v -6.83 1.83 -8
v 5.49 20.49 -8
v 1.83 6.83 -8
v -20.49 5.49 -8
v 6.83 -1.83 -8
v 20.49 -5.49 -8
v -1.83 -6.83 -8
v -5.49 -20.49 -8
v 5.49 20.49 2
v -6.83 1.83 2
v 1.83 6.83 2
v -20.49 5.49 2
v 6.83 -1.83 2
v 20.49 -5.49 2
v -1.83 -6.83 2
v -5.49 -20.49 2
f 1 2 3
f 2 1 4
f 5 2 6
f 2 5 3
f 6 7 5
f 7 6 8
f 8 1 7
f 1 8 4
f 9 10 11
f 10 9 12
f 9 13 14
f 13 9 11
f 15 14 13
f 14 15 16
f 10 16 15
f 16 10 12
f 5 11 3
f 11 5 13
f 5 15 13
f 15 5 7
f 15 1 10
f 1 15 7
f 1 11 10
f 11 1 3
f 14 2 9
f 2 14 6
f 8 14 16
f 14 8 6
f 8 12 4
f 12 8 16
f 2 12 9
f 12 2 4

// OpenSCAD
translate([0,0,2]) translate([0,0,-10]) union() {
    rotate([0,0,30])
    translate([-15,-15,0]) {
        scale(10) {
            polyhedron(
                //         1------------------0
                //        /|                 /|
                //       / |    9----8      / |
                //      /  5-- /|   /| ----/--4
                //     /  /  11----10|    /  /
                //    /  /    |13--|-12  /  /
                //   3------  |/   |/ --2  /
                //   | /     15----14   | /
                //   |/                 |/
                //   7------------------6
                points=[
                    [3,3,1],
                    [0,3,1],
                    [3,0,1],
                    [0,0,1],
                    [3,3,0],
                    [0,3,0],
                    [3,0,0],
                    [0,0,0],

                    [2,2,1],
                    [1,2,1],
                    [2,1,1],
                    [1,1,1],
                    [2,2,0],
                    [1,2,0],
                    [2,1,0],
                    [1,1,0],
                ],
                faces=[
                    [  4,  5, 13, 12 ],
                    [  4, 12, 14,  6 ],
                    [  6, 14, 15,  7 ],
                    [  7, 15, 13,  5 ],

                    [  1,  0,  8,  9 ],
                    [  0,  2, 10,  8 ],
                    [  2,  3, 11, 10 ],
                    [  3,  1,  9, 11 ],

                    [  8, 10, 14, 12 ],
                    [ 10, 11, 15, 14 ],
                    [ 11,  9, 13, 15 ],
                    [  9,  8, 12, 13 ],

                    [  0,  4,  6,  2 ],
                    [  2,  6,  7,  3 ],
                    [  3,  7,  5,  1 ],
                    [  1,  5,  4,  0 ],
                ]
            );
        };
    }
}
